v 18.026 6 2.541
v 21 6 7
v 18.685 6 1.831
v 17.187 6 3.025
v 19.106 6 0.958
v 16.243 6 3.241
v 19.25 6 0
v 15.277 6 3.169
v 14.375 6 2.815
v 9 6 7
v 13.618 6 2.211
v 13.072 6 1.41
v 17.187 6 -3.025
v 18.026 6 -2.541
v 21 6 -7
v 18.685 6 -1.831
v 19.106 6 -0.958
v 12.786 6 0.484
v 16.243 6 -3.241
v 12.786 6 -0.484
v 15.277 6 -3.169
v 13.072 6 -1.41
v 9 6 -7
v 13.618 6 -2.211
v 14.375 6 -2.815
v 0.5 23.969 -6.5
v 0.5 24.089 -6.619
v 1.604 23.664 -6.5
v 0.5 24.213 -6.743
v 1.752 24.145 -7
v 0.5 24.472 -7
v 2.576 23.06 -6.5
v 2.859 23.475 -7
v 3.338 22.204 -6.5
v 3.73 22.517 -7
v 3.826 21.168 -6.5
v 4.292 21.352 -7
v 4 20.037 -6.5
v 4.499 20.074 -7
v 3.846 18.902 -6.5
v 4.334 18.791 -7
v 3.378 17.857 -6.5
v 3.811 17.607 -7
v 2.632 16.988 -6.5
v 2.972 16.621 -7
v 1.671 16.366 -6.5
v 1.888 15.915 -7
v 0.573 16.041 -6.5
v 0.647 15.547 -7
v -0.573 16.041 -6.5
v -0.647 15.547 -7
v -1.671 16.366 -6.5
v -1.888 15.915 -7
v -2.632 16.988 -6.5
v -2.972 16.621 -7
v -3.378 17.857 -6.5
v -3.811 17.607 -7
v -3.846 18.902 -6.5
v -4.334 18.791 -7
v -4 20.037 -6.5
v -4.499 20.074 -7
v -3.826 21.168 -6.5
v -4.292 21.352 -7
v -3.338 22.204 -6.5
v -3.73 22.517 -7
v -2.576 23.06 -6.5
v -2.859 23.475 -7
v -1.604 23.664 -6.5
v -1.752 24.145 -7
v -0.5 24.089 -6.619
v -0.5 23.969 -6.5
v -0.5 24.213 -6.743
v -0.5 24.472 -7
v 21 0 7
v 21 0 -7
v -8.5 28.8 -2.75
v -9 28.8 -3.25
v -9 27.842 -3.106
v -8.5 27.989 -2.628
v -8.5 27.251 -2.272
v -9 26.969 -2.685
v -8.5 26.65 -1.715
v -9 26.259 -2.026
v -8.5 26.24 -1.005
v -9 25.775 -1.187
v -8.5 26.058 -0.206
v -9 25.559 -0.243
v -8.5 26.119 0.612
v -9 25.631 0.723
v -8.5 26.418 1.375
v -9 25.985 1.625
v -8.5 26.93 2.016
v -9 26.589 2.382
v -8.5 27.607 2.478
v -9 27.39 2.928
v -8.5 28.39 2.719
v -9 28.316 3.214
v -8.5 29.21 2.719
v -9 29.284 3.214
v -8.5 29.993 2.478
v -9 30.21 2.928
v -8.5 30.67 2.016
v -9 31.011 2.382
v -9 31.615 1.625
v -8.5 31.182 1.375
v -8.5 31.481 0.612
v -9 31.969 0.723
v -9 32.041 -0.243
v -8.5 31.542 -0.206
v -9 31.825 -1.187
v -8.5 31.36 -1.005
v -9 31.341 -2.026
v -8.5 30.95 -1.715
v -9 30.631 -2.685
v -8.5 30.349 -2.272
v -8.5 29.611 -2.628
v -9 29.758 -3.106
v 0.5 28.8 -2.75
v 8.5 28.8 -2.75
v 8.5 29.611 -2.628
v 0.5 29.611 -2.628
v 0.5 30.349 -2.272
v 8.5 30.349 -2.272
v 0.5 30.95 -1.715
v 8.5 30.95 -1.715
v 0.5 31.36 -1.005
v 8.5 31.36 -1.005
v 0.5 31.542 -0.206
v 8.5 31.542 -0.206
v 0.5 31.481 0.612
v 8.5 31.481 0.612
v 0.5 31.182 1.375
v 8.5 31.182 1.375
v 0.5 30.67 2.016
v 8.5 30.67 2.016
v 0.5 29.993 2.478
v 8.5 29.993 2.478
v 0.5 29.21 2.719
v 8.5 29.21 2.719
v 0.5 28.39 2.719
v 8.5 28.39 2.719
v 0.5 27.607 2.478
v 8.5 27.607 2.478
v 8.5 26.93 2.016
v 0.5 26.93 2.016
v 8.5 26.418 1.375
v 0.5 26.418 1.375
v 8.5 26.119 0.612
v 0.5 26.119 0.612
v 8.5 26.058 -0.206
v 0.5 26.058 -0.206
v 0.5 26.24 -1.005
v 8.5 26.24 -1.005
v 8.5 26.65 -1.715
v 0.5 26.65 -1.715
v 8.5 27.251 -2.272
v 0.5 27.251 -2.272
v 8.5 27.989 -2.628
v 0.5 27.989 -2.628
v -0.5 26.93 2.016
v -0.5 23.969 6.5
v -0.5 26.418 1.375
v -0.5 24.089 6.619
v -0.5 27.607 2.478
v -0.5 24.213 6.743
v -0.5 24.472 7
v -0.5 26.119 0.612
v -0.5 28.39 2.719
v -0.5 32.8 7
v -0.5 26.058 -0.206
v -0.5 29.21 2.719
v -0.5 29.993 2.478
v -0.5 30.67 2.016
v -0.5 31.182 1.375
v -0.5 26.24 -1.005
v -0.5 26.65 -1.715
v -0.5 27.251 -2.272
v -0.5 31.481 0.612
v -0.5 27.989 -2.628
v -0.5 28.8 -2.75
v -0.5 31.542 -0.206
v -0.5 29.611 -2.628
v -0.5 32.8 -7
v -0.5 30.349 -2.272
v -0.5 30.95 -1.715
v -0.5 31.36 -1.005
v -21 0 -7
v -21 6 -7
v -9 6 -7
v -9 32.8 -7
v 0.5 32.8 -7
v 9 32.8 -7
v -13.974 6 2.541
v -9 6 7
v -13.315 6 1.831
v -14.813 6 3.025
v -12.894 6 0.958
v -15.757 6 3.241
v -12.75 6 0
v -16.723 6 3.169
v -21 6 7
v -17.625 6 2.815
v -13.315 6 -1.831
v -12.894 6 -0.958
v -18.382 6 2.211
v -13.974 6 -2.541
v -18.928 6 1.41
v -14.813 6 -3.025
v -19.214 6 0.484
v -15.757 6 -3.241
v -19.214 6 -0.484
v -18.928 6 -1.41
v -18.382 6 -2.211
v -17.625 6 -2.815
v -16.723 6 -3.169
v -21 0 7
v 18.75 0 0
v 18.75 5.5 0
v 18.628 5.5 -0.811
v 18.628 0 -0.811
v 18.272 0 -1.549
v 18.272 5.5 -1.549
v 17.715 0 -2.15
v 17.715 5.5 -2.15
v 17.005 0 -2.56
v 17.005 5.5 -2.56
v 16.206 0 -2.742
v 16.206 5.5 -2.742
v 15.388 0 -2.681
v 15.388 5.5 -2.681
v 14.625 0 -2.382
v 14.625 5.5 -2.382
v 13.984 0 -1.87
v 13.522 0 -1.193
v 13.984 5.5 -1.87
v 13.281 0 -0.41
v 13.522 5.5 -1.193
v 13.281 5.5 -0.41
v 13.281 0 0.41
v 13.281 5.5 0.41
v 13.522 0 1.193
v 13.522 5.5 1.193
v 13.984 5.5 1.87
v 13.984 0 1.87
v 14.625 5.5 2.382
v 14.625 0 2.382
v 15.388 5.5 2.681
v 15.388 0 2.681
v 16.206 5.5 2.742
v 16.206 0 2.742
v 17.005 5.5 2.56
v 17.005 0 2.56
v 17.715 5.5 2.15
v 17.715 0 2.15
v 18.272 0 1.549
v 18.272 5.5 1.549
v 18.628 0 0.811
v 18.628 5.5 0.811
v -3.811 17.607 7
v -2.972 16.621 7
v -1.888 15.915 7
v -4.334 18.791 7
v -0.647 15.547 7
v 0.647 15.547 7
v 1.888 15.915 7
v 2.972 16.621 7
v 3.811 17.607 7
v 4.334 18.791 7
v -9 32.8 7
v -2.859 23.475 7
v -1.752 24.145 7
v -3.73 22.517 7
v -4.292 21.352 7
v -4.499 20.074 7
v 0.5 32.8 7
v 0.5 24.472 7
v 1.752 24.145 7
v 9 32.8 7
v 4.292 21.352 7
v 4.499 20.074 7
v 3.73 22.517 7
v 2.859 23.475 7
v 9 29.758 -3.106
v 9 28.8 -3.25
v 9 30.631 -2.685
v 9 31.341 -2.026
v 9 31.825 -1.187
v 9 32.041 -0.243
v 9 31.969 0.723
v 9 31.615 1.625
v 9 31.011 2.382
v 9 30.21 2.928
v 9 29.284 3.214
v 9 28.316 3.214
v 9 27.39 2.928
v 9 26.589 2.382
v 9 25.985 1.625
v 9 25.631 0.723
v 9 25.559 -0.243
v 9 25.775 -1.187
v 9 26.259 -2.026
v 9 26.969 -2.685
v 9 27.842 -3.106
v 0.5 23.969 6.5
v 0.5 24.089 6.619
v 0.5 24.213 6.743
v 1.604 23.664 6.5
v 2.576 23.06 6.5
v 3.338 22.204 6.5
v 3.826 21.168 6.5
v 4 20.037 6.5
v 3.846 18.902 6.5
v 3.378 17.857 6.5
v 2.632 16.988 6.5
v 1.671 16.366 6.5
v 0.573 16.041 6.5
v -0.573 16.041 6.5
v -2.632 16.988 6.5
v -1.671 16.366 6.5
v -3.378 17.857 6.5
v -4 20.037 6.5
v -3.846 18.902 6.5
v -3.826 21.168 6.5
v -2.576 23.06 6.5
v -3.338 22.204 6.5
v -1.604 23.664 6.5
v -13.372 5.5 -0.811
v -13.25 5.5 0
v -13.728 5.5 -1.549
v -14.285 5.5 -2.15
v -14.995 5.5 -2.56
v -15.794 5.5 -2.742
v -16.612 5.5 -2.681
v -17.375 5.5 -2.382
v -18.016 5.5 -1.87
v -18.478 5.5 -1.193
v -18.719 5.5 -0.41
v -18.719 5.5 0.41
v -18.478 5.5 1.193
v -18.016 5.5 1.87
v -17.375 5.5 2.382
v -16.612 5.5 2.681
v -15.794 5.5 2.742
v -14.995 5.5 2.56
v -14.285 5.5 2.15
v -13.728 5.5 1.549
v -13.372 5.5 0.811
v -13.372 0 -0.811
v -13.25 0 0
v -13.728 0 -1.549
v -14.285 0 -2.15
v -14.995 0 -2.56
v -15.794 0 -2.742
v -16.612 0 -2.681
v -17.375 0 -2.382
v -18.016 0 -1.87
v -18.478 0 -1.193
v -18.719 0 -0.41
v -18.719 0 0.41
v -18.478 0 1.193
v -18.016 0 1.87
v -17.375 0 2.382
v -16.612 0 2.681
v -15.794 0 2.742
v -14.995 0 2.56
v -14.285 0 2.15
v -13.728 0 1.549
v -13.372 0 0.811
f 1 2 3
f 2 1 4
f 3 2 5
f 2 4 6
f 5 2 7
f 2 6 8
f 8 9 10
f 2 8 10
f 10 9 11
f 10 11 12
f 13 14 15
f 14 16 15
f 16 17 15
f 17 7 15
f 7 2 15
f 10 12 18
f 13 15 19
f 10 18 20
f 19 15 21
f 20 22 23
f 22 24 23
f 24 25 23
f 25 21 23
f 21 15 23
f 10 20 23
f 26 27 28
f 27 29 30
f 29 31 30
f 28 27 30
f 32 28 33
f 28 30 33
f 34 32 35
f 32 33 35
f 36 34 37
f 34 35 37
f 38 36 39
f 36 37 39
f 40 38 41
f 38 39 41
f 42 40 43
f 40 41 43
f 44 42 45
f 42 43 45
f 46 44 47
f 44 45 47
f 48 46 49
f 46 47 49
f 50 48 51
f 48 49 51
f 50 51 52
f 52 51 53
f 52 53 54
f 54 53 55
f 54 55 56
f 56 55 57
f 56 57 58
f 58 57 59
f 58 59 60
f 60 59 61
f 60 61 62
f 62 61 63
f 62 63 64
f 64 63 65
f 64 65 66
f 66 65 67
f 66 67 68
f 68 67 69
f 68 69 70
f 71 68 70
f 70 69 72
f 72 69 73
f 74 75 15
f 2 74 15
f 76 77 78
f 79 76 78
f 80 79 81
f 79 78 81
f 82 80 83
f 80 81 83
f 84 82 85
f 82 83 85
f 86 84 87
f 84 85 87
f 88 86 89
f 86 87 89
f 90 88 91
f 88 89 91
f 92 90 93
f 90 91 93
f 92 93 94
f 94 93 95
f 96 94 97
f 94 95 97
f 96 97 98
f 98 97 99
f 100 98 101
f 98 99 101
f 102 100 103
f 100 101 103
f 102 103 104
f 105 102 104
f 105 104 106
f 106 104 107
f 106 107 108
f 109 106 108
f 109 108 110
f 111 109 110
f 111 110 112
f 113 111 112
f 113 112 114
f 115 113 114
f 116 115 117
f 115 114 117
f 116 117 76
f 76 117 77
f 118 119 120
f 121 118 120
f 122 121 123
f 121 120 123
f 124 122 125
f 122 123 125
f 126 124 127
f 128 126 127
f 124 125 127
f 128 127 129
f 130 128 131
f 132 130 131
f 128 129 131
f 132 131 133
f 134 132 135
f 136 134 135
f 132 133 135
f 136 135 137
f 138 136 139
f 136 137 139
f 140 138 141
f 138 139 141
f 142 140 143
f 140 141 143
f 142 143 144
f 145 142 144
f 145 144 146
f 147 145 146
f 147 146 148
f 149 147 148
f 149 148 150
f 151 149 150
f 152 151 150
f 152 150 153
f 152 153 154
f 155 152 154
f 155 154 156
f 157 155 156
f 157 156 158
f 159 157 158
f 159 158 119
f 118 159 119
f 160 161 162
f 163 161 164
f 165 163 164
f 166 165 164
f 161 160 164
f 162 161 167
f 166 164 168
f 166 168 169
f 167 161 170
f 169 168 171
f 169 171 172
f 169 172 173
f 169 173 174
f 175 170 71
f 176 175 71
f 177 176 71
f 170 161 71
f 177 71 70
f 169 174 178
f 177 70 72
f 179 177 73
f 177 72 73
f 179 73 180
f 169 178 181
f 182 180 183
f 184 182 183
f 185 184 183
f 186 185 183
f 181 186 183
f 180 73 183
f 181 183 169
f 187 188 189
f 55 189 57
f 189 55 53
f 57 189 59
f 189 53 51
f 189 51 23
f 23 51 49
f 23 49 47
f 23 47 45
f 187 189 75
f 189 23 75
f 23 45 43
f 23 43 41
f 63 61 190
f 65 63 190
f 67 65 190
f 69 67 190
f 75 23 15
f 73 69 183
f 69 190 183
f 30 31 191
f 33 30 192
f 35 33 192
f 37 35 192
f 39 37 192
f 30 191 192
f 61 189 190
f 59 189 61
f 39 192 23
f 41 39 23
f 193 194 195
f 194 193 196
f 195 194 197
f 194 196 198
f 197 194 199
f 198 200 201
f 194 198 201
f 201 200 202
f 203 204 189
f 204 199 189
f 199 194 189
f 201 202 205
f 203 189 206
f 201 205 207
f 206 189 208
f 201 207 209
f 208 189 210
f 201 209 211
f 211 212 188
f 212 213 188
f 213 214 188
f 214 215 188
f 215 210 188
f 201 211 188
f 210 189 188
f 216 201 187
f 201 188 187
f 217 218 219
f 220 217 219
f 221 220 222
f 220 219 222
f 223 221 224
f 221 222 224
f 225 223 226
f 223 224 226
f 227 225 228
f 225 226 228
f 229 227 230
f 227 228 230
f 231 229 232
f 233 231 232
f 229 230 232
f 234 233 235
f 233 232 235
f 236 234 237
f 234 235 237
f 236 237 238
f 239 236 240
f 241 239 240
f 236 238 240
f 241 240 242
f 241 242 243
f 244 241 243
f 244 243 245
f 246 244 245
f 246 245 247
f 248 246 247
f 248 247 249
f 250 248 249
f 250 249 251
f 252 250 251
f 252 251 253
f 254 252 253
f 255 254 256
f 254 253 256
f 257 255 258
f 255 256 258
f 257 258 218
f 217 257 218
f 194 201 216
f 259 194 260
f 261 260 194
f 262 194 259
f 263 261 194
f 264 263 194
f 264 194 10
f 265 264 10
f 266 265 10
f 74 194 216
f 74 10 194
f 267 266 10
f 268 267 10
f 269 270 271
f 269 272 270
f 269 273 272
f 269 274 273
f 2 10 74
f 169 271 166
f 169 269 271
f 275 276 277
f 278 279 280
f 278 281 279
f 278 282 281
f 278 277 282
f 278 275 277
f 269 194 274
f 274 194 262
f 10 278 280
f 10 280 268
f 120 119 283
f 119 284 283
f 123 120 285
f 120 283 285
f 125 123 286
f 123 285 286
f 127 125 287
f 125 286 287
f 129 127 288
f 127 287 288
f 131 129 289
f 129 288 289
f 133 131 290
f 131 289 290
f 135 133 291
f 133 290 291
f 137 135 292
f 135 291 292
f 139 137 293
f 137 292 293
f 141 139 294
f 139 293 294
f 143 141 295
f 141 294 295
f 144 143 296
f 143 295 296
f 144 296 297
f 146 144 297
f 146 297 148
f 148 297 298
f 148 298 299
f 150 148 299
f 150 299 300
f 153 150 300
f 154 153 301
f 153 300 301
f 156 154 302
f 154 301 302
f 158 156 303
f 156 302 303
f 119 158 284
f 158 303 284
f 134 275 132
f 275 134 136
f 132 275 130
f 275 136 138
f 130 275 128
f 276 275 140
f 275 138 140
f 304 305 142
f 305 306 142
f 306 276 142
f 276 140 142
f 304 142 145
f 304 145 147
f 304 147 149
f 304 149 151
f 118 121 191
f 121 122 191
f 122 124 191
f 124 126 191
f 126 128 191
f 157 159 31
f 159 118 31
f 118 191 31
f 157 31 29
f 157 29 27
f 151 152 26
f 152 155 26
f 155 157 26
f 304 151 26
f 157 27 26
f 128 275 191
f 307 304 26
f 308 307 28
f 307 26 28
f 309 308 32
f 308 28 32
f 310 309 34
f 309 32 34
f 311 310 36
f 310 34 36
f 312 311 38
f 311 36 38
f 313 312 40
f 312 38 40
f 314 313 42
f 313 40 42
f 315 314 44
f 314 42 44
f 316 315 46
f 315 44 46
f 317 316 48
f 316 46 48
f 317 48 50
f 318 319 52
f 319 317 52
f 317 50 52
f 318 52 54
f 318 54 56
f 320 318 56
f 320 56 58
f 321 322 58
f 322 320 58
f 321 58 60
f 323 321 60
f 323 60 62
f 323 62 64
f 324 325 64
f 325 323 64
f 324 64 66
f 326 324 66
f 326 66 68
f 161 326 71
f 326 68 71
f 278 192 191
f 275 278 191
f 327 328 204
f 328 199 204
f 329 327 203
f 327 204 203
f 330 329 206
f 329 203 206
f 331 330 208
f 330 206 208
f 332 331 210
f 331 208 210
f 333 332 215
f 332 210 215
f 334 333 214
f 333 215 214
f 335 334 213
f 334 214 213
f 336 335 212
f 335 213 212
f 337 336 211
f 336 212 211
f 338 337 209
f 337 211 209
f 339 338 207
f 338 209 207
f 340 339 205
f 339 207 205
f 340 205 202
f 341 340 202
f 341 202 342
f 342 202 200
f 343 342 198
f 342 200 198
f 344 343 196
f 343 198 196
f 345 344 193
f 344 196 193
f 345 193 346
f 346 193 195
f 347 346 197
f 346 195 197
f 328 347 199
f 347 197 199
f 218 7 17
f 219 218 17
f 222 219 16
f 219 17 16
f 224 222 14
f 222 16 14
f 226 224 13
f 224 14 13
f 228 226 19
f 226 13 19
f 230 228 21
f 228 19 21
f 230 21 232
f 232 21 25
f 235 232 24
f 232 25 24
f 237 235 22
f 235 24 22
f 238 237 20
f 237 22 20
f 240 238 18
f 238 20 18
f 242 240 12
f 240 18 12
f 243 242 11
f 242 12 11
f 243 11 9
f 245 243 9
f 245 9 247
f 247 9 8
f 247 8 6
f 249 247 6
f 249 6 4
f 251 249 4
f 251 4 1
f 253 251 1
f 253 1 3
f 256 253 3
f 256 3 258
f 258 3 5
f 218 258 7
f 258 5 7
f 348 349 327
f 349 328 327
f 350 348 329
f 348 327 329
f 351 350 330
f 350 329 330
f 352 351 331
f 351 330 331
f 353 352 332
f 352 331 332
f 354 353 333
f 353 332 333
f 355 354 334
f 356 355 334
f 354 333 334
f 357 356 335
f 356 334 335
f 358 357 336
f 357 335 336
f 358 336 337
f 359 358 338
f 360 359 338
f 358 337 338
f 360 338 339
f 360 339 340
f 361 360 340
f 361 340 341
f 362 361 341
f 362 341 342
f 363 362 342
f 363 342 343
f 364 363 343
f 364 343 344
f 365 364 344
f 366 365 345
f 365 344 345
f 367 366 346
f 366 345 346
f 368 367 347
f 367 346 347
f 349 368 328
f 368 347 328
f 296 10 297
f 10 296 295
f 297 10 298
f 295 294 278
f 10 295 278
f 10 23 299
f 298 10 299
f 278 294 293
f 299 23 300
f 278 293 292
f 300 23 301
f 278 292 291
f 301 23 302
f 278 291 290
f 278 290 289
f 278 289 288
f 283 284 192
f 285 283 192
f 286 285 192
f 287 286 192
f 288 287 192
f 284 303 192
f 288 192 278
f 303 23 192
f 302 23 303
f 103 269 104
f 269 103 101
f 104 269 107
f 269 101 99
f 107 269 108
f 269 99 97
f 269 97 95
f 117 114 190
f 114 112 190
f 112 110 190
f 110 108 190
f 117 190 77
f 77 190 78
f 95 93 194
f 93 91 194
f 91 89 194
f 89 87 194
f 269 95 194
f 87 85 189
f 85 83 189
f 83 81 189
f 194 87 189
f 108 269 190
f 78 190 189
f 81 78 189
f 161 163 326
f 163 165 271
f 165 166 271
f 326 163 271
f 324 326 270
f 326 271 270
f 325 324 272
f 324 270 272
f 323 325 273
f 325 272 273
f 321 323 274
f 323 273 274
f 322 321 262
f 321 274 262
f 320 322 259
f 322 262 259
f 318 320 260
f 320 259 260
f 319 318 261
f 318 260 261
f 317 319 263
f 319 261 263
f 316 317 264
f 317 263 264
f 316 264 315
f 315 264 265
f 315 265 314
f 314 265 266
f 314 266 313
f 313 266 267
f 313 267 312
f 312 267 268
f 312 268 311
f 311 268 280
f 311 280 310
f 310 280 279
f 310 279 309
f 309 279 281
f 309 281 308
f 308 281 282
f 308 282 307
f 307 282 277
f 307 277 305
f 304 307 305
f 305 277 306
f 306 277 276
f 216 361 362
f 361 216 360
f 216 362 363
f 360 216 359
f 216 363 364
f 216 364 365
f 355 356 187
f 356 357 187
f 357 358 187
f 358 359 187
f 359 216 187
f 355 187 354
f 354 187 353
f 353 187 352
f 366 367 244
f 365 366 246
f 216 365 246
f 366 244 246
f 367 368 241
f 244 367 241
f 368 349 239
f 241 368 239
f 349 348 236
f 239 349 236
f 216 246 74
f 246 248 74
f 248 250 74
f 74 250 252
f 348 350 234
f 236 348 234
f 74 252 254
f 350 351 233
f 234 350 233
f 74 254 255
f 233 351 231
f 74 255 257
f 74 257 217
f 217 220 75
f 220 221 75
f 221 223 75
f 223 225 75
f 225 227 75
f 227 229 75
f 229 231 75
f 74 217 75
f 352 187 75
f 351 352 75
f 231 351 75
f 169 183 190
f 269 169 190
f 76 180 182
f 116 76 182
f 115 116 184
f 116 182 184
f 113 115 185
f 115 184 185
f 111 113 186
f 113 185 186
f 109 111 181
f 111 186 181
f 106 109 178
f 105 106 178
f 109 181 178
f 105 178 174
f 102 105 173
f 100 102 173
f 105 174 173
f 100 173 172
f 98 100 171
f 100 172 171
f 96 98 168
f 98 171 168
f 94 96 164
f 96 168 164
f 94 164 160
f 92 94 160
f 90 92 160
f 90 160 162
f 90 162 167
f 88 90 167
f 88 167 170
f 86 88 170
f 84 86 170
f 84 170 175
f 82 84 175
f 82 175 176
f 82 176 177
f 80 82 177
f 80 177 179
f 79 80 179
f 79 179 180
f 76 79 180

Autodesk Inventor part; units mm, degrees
ref_plane "YZ Plane" through (0, 0, 0) normal (1, 0, 0) x (0, 1, 0)
ref_plane "XZ Plane" through (0, 0, 0) normal (0, 1, 0) x (-1, 0, 0)
ref_plane "XY Plane" through (0, 0, 0) normal (0, 0, 1) x (1, 0, 0)
sketch "Sketch1" plane through (0, 0, 0) normal (0, 0, 1) x (1, 0, 0)
  line L0 (0, 39.36) -> (0, -6.56) projected
  line L1 (-29.4, 0) -> (29.4, 0) projected
  line L2 (-21, 0) -> (21, 0)
  line L3 (21, 0) -> (21, 6)
  line L4 (21, 6) -> (9, 6)
  line L5 (9, 6) -> (9, 32.8)
  line L6 (9, 32.8) -> (0.5, 32.8)
  line L7 (0.5, 32.8) -> (0.5, 23.9686)
  line L8 (-0.5, 23.9686) -> (-0.5, 32.8)
  line L9 (-0.5, 32.8) -> (-9, 32.8)
  line L10 (-9, 32.8) -> (-9, 6)
  line L11 (-9, 6) -> (-21, 6)
  line L12 (-21, 6) -> (-21, 0)
  circle A0 centre (0, 20) radius 4
  point P0 (0, 0)
  dimension "d0" = 42
  dimension "d1" = 6
  dimension "d2" = 20
  dimension "d3" = 32.8
  dimension "d4" = 21
  dimension "d5" = 18
  dimension "d6" = 8
  dimension "d7" = 1
extrude "Extrusion1" add sketch "Sketch1" along normal mid plane 14 contours A0 L7 L6 L5 L4 L3 L1 L0 | L0 L1 L12 L11 L10 L9 L8 A0
sketch "Sketch2" plane through (-21, 6, -7) normal (0, 1, 0) x (1, 0, 0)
  line L0 (0, 0) -> (12, 0) projected
  line L1 (0, 0) -> (0, -14) projected
  line L2 (12, -14) -> (0, -14) projected
  line L3 (12, 0) -> (12, -14) projected
  line L4 (30, 0) -> (42, 0) projected
  line L5 (30, 0) -> (30, -14) projected
  line L6 (42, -14) -> (30, -14) projected
  line L7 (42, 0) -> (42, -14) projected
  circle A0 centre (5, -7) radius 2.75
  circle A1 centre (37, -7) radius 2.75
  line L8 (21, 2.8) -> (21, -16.8) projected
  line L9 (50.4, -7) -> (-8.4, -7) projected
  point P0 (21, -7)
  dimension "d10" = 5.5
  dimension "d11" = 32
  dimension "d21" = 5
extrude "Extrusion2" cut sketch "Sketch2" against normal up to next contours L9 A0 | A0 L9 | L9 A1 | A1 L9
sketch "Sketch3" plane through (9, 6, 7) normal (1, 0, 0) x (0, 0, -1)
  line L0 (14, 26.8) -> (0, 26.8) projected
  line L1 (0, 0) -> (0, 26.8) projected
  line L2 (14, 0) -> (0, 0) projected
  line L3 (14, 26.8) -> (14, 0) projected
  circle A0 centre (7, 22.8) radius 2.75
  line L4 (14, 26.8) -> (0, 26.8) construction
  line L5 (7, 26.8) -> (7, 0) construction
  line L6 (14, 0) -> (0, 0) construction
  point P0 (7, -6)
  dimension "d14" = 5.5
  dimension "d15" = 4
extrude "Extrusion3" cut sketch "Sketch3" against normal up to surface (18 mm away) contours A0
chamfer "Chamfer1" distance 0.5 angle 45 6 edges at (0, 16, 7) (0, 16, -7) (9, 28.8, 2.75) (13.25, 6, 0) (-9, 28.8, 2.75) (-18.75, 6, 0)
properties part number "Linear Rail Shaft Guide" material "Aluminum 6061"
